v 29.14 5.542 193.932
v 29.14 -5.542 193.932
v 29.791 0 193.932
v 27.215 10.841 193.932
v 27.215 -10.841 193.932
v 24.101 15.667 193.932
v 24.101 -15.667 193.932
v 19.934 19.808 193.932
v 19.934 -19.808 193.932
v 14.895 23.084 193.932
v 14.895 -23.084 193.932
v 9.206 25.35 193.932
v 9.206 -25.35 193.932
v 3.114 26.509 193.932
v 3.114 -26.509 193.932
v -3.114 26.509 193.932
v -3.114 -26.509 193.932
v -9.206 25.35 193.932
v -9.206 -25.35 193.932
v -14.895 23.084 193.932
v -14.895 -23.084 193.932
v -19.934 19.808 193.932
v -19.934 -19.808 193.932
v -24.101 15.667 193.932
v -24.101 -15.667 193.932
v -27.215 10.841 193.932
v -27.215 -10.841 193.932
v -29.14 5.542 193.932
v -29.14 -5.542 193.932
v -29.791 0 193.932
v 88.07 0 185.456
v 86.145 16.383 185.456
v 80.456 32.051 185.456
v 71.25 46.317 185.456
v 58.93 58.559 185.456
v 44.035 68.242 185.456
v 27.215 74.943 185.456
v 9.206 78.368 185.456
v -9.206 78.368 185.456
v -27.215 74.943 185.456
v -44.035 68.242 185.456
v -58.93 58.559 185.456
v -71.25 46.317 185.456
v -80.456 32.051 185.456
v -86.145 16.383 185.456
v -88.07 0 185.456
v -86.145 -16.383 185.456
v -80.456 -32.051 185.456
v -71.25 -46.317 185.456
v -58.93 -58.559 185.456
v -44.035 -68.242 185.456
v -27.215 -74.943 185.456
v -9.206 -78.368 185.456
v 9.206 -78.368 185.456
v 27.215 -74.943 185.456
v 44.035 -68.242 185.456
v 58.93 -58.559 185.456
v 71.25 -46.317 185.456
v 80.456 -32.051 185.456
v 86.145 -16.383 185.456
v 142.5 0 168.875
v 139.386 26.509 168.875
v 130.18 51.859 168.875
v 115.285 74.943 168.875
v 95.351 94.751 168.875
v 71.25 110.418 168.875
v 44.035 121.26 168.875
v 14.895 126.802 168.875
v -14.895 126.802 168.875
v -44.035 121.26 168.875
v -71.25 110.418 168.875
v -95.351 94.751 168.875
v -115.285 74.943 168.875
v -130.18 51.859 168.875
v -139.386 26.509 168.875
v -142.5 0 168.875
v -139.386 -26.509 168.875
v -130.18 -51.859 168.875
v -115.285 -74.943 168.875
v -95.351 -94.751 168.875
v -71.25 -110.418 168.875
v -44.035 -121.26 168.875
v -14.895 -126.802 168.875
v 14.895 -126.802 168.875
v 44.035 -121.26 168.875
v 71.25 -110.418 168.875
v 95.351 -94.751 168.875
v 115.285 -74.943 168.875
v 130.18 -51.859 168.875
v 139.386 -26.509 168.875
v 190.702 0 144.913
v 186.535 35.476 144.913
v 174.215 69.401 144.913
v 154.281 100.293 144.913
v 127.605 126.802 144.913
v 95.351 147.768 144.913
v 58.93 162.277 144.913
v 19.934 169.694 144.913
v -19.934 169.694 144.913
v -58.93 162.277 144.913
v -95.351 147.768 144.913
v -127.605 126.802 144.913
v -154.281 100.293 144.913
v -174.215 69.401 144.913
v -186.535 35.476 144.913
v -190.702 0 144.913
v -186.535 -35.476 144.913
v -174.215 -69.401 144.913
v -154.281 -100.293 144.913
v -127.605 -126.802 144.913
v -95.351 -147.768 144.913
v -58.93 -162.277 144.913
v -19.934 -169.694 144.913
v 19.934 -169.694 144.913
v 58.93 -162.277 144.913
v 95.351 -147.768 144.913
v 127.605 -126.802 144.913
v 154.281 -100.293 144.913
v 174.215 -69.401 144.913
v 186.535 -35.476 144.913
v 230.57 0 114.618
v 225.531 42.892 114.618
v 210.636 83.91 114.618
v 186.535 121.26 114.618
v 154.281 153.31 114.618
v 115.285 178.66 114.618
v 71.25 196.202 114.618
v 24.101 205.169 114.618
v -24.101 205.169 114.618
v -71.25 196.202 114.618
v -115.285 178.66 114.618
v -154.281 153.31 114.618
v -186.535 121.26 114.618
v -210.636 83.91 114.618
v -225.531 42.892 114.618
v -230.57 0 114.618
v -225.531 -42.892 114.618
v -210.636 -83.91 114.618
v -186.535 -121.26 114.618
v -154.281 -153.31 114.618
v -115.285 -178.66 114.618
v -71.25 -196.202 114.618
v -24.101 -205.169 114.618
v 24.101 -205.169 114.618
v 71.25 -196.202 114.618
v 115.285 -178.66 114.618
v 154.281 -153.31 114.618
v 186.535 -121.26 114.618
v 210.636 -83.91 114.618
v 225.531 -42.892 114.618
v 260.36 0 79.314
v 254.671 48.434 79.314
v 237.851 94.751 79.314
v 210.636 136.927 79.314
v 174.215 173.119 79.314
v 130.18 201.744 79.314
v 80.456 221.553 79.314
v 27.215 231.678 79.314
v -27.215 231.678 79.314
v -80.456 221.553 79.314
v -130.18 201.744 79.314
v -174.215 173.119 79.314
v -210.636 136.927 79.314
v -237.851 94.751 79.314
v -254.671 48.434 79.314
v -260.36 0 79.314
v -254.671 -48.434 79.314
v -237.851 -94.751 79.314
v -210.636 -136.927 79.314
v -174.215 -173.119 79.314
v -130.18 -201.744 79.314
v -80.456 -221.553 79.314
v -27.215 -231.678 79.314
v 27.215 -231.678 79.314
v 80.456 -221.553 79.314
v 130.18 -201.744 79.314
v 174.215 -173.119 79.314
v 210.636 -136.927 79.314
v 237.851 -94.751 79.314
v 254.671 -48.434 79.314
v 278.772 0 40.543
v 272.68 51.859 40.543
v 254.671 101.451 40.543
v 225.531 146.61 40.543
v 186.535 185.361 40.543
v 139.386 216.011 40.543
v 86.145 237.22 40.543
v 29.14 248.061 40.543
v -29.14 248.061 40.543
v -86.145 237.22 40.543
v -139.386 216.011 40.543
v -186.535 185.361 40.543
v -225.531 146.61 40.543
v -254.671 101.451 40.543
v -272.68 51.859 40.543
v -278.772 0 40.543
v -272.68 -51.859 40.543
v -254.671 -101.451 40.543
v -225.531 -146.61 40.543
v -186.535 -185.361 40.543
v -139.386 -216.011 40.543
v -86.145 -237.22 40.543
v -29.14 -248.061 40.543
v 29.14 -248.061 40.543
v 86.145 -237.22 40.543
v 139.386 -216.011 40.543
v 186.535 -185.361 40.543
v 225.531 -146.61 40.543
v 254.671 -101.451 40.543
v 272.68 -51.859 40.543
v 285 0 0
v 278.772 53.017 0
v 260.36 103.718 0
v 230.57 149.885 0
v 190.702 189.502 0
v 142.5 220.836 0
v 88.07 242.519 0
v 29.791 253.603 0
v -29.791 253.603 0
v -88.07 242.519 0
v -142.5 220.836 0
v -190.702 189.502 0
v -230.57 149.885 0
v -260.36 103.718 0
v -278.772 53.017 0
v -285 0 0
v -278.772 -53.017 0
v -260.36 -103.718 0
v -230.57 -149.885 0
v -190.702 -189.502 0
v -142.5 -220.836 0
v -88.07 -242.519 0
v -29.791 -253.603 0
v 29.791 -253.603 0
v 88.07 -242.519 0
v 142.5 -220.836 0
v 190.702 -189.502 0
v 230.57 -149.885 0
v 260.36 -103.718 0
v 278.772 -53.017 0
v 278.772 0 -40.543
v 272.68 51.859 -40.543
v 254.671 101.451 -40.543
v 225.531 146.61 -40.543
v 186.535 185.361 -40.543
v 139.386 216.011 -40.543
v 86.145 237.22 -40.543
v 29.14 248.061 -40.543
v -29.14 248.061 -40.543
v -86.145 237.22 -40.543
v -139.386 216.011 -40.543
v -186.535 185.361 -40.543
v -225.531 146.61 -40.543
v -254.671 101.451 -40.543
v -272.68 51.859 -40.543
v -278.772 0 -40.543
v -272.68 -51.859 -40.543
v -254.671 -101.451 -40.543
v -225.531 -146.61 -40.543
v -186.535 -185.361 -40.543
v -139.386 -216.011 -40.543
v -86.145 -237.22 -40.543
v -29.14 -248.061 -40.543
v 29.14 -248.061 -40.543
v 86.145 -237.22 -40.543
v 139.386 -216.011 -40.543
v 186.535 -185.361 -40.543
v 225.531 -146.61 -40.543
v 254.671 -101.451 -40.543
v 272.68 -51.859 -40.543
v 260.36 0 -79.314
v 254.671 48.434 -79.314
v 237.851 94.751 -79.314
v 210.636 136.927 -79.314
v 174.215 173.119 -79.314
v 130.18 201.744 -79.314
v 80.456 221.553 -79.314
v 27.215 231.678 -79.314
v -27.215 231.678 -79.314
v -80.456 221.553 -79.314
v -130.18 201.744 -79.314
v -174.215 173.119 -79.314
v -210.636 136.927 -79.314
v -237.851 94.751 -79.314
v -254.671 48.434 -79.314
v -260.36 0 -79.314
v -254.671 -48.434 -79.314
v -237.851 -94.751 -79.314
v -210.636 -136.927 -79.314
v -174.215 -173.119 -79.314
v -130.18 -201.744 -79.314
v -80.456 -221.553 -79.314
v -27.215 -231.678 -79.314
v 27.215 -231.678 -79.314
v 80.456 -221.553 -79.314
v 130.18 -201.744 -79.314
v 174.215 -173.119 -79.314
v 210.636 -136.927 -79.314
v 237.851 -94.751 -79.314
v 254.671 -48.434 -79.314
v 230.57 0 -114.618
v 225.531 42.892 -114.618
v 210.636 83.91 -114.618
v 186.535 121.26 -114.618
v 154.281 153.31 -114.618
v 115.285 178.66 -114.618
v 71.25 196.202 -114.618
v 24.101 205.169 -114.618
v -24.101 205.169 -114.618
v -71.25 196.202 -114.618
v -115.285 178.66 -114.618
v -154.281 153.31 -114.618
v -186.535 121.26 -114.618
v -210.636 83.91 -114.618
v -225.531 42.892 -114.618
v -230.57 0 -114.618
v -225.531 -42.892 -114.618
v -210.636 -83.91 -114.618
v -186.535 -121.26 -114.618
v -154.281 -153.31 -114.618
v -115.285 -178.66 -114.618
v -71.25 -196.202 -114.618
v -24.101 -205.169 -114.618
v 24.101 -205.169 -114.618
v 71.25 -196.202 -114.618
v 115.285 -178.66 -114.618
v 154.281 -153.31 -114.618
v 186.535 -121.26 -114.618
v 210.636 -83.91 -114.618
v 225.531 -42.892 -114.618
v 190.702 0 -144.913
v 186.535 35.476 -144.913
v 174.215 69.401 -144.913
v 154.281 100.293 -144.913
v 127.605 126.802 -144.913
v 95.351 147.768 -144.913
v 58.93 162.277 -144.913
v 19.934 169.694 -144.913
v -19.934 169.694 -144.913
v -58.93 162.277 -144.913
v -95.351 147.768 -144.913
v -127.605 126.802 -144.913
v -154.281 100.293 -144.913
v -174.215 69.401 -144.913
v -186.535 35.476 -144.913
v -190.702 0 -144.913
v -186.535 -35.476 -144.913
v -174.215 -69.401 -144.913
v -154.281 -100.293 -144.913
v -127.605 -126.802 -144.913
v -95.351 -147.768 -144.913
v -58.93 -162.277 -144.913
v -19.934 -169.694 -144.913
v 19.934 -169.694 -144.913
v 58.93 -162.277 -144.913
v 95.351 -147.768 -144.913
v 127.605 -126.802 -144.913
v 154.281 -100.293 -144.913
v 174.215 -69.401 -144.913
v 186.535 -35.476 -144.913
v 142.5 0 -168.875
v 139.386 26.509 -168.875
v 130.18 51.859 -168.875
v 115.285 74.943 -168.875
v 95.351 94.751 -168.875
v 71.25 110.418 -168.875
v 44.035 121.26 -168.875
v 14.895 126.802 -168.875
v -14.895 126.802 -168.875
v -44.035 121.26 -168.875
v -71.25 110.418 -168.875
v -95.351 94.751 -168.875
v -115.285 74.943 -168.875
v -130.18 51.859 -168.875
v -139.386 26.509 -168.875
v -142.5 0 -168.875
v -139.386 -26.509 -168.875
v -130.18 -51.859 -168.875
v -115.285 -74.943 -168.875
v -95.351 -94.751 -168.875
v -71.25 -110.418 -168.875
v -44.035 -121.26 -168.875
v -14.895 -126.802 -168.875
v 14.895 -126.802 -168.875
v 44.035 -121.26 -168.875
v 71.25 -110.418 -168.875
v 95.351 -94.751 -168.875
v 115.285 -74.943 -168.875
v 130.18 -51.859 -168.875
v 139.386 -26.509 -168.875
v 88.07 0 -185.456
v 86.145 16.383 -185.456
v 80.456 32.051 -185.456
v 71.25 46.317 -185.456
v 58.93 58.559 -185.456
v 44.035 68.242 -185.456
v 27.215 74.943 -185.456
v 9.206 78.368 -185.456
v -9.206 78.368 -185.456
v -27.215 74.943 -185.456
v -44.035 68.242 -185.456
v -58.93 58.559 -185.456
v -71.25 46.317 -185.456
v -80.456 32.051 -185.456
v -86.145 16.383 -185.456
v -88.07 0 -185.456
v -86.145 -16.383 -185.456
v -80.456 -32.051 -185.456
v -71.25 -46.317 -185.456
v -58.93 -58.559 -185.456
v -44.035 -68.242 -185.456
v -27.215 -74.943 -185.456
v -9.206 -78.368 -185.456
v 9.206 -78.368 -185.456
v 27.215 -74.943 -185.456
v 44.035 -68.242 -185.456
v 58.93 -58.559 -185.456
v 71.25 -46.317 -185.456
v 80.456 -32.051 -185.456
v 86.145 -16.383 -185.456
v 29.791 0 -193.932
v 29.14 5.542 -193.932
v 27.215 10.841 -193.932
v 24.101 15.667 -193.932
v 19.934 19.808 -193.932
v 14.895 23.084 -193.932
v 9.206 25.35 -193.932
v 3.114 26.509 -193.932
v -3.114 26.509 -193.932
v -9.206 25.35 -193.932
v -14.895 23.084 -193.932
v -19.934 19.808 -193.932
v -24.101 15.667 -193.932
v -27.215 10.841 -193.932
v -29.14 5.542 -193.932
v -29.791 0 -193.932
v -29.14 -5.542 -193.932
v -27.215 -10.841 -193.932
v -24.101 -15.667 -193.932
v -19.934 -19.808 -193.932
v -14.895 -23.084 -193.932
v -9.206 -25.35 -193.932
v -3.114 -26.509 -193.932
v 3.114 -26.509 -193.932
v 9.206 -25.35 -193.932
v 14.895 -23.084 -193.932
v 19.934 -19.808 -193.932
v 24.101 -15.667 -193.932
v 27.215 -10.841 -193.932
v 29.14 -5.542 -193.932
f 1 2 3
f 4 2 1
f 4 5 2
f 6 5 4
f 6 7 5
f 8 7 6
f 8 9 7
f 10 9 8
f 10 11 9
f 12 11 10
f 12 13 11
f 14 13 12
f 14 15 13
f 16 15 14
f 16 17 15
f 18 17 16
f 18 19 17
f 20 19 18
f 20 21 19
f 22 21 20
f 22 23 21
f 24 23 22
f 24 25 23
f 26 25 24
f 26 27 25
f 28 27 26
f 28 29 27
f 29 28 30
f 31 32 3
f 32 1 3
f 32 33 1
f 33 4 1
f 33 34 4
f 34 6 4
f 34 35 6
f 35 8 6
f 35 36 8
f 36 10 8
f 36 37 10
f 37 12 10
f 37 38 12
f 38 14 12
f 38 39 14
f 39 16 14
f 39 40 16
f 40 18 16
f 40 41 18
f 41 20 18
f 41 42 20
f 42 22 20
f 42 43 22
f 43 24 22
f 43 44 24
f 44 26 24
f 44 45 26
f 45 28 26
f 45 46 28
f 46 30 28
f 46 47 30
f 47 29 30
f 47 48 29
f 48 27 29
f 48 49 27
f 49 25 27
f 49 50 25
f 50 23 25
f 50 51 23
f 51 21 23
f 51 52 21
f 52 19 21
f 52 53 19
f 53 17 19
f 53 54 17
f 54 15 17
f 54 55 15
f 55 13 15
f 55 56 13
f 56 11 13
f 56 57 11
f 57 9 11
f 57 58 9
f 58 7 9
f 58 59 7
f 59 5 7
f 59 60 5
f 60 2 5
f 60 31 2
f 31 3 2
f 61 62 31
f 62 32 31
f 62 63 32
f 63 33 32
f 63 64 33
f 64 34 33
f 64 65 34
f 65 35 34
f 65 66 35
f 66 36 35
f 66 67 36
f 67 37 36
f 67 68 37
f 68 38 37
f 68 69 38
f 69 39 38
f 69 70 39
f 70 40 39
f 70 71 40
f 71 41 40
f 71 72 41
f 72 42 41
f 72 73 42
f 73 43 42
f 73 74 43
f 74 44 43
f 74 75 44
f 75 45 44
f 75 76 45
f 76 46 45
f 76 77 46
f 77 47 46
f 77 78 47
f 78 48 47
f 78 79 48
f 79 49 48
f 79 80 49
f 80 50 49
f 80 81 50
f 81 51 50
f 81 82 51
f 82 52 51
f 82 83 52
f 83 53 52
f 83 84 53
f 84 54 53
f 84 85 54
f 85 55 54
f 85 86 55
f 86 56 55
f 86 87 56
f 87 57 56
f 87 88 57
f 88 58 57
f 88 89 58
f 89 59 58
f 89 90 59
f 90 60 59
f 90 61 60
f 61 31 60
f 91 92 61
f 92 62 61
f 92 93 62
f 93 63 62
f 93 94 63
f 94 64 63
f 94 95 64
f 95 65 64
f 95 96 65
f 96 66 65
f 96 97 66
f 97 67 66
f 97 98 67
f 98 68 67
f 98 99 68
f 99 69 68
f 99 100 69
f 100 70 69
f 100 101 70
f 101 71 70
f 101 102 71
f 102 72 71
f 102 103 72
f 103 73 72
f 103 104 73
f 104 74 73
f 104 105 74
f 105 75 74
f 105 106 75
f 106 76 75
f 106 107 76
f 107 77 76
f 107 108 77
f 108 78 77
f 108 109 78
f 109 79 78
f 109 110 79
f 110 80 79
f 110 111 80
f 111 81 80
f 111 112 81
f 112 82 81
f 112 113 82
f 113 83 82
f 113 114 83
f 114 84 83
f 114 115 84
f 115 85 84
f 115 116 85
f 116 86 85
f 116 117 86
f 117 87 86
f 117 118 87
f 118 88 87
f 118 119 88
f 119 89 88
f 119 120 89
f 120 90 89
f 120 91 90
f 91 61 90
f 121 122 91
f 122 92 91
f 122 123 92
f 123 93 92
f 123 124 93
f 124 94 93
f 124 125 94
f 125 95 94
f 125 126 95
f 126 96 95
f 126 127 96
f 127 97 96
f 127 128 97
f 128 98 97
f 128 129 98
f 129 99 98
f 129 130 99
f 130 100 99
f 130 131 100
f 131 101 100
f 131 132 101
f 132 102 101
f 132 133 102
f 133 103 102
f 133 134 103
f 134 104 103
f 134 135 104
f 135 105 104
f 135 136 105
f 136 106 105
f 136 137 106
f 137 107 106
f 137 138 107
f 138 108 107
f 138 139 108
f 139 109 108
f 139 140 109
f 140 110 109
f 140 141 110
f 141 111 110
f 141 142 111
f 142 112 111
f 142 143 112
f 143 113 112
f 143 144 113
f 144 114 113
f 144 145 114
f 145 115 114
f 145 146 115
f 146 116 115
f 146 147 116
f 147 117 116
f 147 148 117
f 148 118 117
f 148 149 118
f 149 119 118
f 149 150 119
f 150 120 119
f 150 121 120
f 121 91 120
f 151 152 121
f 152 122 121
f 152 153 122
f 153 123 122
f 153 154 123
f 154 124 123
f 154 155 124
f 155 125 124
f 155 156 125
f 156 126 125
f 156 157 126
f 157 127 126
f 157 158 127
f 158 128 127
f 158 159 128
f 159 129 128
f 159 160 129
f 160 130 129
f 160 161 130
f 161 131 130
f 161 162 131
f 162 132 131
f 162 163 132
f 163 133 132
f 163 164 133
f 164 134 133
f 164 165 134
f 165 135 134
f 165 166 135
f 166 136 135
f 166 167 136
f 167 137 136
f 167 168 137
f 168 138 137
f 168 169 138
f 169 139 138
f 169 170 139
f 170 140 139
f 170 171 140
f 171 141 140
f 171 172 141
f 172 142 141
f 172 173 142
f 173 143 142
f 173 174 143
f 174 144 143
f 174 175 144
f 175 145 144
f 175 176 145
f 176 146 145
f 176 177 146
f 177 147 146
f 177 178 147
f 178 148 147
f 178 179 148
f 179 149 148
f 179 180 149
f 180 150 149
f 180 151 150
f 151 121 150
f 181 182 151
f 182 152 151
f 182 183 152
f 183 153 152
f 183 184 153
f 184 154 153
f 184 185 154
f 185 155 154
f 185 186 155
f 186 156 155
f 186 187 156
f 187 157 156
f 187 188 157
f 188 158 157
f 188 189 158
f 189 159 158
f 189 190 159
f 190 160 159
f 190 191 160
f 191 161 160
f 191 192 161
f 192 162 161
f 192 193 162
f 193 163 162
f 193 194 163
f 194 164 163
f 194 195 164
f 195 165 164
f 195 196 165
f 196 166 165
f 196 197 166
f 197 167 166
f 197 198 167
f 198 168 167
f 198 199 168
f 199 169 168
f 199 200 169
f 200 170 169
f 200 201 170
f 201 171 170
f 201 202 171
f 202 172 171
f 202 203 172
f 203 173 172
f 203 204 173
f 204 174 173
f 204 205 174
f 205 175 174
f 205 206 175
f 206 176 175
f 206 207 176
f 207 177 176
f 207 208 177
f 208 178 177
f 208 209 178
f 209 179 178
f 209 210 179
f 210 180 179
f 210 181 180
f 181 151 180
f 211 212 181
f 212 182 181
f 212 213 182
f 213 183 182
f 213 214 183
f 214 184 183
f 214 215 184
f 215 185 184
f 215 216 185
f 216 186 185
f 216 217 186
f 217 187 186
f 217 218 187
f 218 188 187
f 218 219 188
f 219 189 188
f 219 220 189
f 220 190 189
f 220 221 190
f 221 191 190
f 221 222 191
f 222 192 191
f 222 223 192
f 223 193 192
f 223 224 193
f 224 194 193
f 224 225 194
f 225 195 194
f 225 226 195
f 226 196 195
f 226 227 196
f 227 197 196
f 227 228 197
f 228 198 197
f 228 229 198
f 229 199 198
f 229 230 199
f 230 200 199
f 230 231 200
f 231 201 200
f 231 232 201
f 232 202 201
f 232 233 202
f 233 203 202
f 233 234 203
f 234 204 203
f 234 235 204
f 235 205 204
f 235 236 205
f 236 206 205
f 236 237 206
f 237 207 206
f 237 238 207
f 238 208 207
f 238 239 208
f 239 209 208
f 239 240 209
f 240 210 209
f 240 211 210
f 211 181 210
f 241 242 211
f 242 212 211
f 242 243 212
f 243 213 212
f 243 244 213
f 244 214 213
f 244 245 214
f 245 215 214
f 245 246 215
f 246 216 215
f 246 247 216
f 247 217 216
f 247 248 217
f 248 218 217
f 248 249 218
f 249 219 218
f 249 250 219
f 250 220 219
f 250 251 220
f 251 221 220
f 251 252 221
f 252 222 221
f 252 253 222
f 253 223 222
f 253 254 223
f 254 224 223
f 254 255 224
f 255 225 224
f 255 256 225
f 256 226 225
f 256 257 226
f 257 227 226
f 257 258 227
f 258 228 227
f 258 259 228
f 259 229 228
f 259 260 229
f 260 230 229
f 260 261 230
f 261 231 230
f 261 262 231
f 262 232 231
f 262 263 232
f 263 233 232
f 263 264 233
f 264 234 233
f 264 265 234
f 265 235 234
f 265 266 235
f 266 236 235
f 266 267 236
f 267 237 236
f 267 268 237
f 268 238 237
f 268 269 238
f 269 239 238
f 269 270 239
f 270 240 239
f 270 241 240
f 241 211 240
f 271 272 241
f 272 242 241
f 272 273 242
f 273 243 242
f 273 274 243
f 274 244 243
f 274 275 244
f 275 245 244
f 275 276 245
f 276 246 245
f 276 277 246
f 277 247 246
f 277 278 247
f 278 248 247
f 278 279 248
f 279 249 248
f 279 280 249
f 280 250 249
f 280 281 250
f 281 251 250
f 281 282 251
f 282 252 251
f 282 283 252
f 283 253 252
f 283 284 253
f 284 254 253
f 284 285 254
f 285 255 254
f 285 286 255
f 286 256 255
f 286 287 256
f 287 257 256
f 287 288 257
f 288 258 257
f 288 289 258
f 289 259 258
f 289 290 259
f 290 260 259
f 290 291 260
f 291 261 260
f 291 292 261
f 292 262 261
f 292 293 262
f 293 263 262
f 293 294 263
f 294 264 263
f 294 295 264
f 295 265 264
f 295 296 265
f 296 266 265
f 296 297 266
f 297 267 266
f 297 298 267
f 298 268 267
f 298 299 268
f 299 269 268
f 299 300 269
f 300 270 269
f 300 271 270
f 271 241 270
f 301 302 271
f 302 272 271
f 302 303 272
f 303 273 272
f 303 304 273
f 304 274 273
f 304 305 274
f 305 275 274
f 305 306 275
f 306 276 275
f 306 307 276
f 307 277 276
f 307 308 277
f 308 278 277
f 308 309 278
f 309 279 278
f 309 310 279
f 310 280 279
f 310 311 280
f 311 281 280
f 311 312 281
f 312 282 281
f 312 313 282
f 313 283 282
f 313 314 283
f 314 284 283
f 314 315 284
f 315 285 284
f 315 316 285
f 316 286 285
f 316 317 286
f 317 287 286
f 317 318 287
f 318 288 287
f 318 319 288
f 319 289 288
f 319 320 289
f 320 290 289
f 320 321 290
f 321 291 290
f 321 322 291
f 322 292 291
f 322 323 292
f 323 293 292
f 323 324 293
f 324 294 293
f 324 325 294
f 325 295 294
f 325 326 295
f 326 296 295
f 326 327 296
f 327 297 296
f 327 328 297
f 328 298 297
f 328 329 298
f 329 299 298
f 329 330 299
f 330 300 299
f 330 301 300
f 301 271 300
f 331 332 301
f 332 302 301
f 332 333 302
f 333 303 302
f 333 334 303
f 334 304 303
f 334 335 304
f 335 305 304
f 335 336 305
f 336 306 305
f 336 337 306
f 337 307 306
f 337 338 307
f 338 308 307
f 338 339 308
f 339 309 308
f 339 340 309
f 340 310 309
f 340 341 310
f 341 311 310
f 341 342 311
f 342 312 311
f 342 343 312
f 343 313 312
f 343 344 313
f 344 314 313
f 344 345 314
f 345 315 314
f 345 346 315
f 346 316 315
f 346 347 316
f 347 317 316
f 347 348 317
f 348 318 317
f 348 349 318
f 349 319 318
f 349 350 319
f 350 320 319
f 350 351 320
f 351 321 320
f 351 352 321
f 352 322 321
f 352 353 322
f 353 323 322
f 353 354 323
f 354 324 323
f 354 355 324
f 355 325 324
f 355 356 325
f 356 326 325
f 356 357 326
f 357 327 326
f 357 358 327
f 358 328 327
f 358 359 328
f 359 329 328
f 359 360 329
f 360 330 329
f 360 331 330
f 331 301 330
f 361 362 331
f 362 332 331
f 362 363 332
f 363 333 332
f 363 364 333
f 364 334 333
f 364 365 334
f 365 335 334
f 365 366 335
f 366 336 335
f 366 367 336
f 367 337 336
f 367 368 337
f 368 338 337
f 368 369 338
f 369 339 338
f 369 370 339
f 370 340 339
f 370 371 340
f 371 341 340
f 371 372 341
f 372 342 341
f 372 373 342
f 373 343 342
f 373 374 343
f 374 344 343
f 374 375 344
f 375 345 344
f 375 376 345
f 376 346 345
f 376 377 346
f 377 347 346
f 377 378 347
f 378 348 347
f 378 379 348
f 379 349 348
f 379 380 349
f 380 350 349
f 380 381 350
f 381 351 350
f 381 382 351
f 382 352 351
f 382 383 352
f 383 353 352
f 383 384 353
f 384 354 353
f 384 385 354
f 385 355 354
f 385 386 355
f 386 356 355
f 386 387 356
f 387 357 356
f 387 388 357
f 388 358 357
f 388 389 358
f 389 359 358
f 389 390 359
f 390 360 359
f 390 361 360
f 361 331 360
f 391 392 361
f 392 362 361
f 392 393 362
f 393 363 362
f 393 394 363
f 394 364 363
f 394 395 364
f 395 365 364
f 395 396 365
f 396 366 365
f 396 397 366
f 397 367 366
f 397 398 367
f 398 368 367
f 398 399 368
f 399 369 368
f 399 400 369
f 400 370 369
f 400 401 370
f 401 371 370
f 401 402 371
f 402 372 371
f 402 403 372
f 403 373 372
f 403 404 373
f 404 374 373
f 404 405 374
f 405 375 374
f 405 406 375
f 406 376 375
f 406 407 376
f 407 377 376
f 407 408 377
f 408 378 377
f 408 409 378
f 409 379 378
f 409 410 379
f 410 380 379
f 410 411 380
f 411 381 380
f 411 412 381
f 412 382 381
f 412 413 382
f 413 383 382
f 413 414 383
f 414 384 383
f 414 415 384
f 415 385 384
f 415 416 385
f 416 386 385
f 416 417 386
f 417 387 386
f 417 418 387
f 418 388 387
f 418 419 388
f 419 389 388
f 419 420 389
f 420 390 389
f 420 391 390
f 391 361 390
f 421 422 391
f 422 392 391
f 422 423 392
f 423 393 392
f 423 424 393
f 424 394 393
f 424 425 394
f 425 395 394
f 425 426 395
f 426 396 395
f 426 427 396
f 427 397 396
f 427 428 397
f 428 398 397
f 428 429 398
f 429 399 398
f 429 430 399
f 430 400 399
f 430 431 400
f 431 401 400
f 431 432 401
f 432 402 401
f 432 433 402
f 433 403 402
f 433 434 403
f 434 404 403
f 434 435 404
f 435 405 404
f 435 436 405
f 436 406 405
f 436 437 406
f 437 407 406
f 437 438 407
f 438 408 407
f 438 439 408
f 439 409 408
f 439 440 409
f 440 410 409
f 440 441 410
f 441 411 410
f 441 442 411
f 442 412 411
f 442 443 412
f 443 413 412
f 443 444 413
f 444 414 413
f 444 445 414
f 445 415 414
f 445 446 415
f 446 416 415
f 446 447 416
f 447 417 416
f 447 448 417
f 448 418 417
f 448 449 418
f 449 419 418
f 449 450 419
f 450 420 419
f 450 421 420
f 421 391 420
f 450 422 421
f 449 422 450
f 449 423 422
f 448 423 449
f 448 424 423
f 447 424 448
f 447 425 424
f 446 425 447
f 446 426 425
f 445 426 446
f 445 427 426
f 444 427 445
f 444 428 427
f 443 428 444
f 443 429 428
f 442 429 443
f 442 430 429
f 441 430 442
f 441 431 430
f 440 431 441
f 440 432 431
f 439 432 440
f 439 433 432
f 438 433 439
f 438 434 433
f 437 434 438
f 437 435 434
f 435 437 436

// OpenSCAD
// Generated by SolidPython 1.0.1 on 2020-07-29 00:46:54


scale(v = [19, 17, 13]) {
	sphere(r = 15);
}
/***********************************************
*********      SolidPython code:      **********
************************************************
 
# import packages: SolidPython
from solid import *
from solid.utils import *
from itertools import chain, combinations, permutations


class Resize:

    def __init__(self, scad_file):
        self.scad_file = scad_file
        #self.scad_file = import_scad(scad_file)
        # cone/cylinder param:
        self.r1 = 0
        self.r2 = 0
        self.h = 0
        # rectangular prism param:
        self.w = 0
        self.l = 0
        # ellipse param:
        self.r = 0

    # import OpenScad code (file name corresponds to shape)


    # classify shape + parameters
    def assign(self, param1, param2, param3):
        if self.scad_file == 'cone.scad':
            self.r1 = param1
            self.r2 = param2
            self.h = param3
        elif self.scad_file == 'cylinder.scad':
            self.r1 = param1
            self.r2 = param2
            self.h = param3
        elif self.scad_file == 'rectangularPrism.scad':
            self.h = param1
            self.l = param2
            self.w = param3
        else:
            self.r = param1
            self.h = param2

    # resize parameters
    def iterate(self):
        x = range(3, 20, 2)
        i = 1
        if self.scad_file == 'cone.scad':
            tempList = list(permutations(x, 2))
            for temp in tempList:
                param1 = temp[0]
                param2 = temp[1]
                filepath = 'produced_scad_files/' + 'cone' + str(param1) + '_' + str(param2) + '_' + '.scad'
                scad_render_to_file(cylinder(h=param1, r1=param2, r2=0), filepath)

        elif self.scad_file == 'cylinder.scad':
            tempList = list(permutations(x, 3))
            for temp in tempList:
                param1 = temp[0]
                param2 = temp[1]
                filepath = 'produced_scad_files/' + 'cylinder' + str(param1) + '_' + str(param2) + '_' + '.scad'
                scad_render_to_file(cylinder(h=param1, r1=param2, r2=param2), filepath)

        elif self.scad_file == 'rectangularPrism.scad':
            tempList = list(permutations(x, 3))
            for temp in tempList:
                param1 = temp[0]
                param2 = temp[1]
                param3 = temp[2]
                filepath = 'produced_scad_files/' + 'rectangularPrism' + str(param1) + '_' + str(param2) + '_' + str(
                    param3) + '.scad'
                scad_render_to_file(cube(size=(param1, param2, param3)), filepath)

        elif self.scad_file == 'ellipse.scad':
            tempList = list(permutations(x, 4))
            for temp in tempList:
                param1 = temp[0]
                param2 = temp[1]
                param3 = temp[2]
                param4 = temp[3]
                filepath = 'produced_scad_files/' + 'ellipse' + str(param1) + '_' + str(param2) + '_' + str(param3) + '_' + str(param4) + '.scad'
                scad_render_to_file(scale([param1, param2, param3])(sphere(r=param4)), filepath)

    def render_to_scadfile(self):
        scad_render_to_file(scad, 'example.scad') 
 
************************************************/
